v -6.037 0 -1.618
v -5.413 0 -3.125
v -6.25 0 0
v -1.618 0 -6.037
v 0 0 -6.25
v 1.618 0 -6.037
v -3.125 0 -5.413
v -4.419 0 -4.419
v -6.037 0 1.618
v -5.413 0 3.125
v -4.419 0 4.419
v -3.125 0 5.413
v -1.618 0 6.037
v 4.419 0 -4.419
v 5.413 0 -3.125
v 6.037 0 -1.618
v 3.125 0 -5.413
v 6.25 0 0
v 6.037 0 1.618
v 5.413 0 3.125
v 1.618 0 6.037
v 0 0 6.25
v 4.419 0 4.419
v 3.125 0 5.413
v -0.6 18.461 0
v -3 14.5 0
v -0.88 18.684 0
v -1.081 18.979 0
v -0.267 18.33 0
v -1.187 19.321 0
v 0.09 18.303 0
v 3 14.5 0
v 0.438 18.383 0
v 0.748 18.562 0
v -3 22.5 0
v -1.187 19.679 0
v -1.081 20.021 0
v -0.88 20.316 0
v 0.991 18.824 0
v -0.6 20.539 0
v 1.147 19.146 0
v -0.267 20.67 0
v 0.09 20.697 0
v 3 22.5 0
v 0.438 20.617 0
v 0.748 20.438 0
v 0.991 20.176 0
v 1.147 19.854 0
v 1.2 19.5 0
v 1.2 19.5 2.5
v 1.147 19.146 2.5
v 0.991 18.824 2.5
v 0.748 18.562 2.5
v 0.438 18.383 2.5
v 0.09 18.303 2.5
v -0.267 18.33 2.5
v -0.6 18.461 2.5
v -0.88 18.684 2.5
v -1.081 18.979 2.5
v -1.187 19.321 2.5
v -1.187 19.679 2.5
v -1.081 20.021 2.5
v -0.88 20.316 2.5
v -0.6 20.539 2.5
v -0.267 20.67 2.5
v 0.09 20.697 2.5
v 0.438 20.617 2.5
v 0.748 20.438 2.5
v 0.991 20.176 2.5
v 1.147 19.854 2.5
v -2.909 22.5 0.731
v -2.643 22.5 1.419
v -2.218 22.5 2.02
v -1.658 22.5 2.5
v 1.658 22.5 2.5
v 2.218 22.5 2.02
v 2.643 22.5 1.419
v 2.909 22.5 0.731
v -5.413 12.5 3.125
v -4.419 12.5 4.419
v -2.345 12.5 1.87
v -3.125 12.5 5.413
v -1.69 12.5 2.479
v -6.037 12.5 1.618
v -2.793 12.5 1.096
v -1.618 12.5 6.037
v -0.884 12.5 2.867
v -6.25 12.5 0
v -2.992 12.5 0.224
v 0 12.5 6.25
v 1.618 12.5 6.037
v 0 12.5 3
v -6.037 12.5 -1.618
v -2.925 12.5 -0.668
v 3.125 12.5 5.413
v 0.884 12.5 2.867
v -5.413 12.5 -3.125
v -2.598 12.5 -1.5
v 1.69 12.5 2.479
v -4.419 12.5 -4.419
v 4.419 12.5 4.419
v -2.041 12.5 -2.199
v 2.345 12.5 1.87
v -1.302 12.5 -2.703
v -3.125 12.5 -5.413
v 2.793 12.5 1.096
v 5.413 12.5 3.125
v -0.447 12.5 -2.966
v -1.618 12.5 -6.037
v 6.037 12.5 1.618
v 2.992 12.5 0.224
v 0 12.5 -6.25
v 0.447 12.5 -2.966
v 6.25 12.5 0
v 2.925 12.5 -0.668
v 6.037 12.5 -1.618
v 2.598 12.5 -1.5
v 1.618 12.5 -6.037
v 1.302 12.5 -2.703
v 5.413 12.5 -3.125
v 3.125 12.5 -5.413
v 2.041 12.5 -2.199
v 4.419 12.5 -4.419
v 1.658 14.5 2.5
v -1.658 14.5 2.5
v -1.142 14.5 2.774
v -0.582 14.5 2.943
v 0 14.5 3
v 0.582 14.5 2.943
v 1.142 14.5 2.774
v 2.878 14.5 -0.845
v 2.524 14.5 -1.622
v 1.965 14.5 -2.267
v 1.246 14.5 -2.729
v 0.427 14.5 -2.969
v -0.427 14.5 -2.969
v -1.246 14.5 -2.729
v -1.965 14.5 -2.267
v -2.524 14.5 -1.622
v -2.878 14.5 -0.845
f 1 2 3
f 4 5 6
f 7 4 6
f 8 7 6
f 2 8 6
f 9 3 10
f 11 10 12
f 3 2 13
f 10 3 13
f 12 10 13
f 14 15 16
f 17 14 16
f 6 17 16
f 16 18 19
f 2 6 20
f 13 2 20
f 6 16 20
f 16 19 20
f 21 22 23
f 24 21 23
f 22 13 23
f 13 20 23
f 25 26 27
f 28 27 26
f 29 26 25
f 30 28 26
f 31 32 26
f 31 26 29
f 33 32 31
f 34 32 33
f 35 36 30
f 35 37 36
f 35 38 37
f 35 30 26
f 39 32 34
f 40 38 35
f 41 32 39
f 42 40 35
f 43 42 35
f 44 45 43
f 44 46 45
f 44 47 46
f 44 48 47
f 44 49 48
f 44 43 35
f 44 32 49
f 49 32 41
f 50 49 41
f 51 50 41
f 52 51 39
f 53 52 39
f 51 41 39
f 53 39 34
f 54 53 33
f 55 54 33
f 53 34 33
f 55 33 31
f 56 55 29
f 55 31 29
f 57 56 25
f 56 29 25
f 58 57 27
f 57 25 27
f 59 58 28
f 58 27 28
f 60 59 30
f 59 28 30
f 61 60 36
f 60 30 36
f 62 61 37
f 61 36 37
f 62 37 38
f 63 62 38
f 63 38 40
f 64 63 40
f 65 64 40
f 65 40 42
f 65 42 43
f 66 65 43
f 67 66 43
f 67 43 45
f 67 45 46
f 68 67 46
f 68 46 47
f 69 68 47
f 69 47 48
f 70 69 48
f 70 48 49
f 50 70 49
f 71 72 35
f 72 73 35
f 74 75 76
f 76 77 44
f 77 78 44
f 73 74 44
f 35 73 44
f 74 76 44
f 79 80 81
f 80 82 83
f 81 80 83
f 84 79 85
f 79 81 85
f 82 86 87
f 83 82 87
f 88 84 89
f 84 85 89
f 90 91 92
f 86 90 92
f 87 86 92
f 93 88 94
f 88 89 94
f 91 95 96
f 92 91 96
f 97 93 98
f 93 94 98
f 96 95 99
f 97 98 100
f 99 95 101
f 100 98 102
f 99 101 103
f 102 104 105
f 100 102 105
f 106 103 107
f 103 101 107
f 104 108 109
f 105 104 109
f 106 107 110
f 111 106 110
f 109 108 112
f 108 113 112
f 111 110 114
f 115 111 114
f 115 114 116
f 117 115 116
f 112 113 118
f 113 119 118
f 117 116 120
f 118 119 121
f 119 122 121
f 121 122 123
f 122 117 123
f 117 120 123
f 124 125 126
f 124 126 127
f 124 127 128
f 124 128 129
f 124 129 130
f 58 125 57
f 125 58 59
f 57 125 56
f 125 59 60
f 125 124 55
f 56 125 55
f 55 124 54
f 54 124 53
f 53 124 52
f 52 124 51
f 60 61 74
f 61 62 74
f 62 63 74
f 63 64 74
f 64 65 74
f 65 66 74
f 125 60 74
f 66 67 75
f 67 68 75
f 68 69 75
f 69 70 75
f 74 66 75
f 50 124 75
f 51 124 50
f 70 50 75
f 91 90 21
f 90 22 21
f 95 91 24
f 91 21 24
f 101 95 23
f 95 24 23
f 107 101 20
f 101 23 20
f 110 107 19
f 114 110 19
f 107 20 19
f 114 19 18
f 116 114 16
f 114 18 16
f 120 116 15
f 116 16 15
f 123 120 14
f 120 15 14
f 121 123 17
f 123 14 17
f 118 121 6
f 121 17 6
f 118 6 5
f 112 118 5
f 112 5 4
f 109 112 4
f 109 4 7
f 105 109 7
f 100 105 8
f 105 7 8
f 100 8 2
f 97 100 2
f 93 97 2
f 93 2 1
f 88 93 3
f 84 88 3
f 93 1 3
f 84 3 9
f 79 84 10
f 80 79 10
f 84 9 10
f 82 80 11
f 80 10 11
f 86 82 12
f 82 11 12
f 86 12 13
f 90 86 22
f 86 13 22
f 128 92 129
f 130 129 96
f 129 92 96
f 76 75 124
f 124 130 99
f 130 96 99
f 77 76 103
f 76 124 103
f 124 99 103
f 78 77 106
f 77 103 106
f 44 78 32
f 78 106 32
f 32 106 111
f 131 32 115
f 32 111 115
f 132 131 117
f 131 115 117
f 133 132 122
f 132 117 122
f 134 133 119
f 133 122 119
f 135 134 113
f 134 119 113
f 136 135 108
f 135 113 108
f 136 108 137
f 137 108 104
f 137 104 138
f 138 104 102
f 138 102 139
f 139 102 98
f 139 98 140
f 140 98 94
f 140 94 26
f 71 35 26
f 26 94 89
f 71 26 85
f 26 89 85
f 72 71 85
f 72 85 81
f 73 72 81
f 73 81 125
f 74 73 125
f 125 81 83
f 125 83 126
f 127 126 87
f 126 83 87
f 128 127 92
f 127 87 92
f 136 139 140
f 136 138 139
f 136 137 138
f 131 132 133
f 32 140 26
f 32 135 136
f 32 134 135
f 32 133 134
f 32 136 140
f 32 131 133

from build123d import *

# Parameters (mm, degrees)
F2_W          = 9.5753744735
F2_H          = 5.0194775218
F2_H_2        = 2.1959905885
F3_DEPTH      = 6.251
F3_DEPTH_BACK = 6.251
F4_R          = 1.2
F5_DEPTH      = 6.251


with BuildPart() as f1:
    # F0 (on Right) → F1 (revolve)
    with BuildSketch(Plane.YZ):
        Polygon((0, 6.25), (0, 0), (22.5, 0), (22.5, 3), (12.5, 3), (12.5, 6.25), align=None)
    revolve(axis=Axis((0, 13.297872428, 0), (0, 1, 0)))

    # F2 (on Right) → F3 (cut, two sides)
    with BuildSketch(Plane.YZ) as f3_sk:
        with Locations((19.2876872367, -2.5097387609)):
            Rectangle(F2_W, F2_H)
        with Locations((19.2876872367, 3.5979952943)):
            Rectangle(F2_W, F2_H_2)
    extrude(amount=-F3_DEPTH, mode=Mode.SUBTRACT)
    extrude(f3_sk.sketch, amount=F3_DEPTH_BACK, mode=Mode.SUBTRACT)

    # F4 (on face) → F5 (cut, through all)
    with BuildSketch(Plane(origin=(0, 0, 0), x_dir=(1, 0, 0), z_dir=(0, 0, -1))):
        with Locations((0, -19.5)):
            Circle(F4_R)
    extrude(amount=-F5_DEPTH, mode=Mode.SUBTRACT)


solid = f1.part
